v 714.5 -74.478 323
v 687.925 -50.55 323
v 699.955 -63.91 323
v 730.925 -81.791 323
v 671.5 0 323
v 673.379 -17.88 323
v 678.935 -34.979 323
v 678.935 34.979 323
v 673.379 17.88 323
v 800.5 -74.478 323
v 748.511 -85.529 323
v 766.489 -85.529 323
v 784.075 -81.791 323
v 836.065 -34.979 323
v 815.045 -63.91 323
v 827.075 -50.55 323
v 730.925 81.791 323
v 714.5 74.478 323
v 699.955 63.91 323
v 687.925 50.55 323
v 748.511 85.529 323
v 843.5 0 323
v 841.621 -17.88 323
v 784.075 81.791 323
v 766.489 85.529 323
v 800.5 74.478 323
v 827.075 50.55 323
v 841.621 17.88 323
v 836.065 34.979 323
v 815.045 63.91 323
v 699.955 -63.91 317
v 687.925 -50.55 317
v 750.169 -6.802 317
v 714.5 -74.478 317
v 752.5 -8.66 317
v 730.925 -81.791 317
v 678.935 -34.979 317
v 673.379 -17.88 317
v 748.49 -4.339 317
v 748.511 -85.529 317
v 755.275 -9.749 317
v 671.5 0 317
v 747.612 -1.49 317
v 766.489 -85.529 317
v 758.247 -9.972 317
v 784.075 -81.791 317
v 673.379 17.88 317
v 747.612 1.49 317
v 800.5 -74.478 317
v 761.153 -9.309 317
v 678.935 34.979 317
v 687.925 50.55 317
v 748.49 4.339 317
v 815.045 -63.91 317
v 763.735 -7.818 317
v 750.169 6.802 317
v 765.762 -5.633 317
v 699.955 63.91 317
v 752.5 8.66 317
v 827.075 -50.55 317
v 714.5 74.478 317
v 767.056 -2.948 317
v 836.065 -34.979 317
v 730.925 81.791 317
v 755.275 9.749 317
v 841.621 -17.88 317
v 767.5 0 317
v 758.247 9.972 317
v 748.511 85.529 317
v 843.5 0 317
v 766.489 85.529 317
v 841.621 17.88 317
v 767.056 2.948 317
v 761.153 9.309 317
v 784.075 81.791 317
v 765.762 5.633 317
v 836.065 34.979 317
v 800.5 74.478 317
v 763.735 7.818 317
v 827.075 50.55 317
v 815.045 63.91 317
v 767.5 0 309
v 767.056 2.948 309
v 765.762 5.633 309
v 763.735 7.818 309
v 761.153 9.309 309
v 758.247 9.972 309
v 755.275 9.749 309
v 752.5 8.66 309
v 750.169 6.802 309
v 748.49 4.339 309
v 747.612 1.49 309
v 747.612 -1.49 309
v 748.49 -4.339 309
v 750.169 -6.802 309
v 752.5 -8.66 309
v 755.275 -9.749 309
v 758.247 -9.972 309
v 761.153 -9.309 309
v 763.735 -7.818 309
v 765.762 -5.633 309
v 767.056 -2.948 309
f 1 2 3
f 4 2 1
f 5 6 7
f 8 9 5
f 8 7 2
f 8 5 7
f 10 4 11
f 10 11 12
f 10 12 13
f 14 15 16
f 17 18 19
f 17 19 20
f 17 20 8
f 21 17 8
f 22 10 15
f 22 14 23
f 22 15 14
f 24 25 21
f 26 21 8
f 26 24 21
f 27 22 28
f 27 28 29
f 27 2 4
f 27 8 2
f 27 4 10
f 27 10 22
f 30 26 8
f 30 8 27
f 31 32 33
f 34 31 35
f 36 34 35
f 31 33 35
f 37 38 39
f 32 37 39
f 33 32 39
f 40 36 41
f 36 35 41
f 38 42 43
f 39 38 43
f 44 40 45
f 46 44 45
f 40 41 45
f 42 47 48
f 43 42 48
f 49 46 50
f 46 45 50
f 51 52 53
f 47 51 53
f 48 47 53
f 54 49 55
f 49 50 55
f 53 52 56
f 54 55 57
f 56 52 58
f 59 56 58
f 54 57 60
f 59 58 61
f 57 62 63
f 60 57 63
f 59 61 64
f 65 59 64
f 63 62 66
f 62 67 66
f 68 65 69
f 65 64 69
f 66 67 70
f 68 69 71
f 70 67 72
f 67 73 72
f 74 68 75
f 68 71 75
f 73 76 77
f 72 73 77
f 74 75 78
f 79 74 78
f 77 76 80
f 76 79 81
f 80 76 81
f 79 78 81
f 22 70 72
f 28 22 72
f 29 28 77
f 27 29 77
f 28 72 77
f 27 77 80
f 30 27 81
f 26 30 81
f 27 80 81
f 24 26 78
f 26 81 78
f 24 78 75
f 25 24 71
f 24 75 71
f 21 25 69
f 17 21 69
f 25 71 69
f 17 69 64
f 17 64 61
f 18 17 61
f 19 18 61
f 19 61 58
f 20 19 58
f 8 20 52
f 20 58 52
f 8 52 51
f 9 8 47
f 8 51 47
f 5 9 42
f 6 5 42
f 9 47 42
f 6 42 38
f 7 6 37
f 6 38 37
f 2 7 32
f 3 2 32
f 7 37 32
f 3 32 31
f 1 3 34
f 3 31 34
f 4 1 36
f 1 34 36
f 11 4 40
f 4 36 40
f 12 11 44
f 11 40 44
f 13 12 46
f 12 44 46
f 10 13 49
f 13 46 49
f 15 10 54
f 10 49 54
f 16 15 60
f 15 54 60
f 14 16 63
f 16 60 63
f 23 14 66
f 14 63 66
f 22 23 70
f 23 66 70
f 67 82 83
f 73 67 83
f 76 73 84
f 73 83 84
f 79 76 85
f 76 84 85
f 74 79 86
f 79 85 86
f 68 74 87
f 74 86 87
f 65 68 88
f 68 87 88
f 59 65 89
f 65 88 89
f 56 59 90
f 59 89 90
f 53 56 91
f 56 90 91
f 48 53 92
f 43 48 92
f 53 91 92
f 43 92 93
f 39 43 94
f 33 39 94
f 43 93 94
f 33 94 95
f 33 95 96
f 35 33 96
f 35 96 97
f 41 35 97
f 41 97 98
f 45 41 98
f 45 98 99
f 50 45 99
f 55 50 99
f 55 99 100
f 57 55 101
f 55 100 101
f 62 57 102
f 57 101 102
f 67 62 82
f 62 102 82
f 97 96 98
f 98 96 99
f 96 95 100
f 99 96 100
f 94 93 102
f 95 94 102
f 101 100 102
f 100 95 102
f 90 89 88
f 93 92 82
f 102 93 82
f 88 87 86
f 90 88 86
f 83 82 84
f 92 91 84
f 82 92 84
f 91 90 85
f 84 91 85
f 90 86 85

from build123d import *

# Parameters (mm, degrees)
EXTRUDE_START      = 317
EXTRUDE_SKETCH_1_R = 86
EXTRUDE_1_DEPTH    = 6
EXTRUDE_START_2    = 309
EXTRUDE_SKETCH_2_R = 10
EXTRUDE_2_DEPTH    = 8


with BuildPart() as part:
    # Extrude sketch 1 → Extrude 1 (new body)
    with BuildSketch(Plane.XY.offset(EXTRUDE_START)):
        with Locations((757.5, 0)):
            Circle(EXTRUDE_SKETCH_1_R)
    extrude(amount=EXTRUDE_1_DEPTH)


with BuildPart() as body_2:
    # Extrude sketch 2 → Extrude 2 (new body)
    with BuildSketch(Plane.XY.offset(EXTRUDE_START_2)):
        with Locations((757.5, 0)):
            Circle(EXTRUDE_SKETCH_2_R)
    extrude(amount=EXTRUDE_2_DEPTH)


with BuildPart() as part_1:
    add(part.part)

    # Combine (weld / assembly of features): union body 2
    add(body_2.part)


solid = part_1.part
